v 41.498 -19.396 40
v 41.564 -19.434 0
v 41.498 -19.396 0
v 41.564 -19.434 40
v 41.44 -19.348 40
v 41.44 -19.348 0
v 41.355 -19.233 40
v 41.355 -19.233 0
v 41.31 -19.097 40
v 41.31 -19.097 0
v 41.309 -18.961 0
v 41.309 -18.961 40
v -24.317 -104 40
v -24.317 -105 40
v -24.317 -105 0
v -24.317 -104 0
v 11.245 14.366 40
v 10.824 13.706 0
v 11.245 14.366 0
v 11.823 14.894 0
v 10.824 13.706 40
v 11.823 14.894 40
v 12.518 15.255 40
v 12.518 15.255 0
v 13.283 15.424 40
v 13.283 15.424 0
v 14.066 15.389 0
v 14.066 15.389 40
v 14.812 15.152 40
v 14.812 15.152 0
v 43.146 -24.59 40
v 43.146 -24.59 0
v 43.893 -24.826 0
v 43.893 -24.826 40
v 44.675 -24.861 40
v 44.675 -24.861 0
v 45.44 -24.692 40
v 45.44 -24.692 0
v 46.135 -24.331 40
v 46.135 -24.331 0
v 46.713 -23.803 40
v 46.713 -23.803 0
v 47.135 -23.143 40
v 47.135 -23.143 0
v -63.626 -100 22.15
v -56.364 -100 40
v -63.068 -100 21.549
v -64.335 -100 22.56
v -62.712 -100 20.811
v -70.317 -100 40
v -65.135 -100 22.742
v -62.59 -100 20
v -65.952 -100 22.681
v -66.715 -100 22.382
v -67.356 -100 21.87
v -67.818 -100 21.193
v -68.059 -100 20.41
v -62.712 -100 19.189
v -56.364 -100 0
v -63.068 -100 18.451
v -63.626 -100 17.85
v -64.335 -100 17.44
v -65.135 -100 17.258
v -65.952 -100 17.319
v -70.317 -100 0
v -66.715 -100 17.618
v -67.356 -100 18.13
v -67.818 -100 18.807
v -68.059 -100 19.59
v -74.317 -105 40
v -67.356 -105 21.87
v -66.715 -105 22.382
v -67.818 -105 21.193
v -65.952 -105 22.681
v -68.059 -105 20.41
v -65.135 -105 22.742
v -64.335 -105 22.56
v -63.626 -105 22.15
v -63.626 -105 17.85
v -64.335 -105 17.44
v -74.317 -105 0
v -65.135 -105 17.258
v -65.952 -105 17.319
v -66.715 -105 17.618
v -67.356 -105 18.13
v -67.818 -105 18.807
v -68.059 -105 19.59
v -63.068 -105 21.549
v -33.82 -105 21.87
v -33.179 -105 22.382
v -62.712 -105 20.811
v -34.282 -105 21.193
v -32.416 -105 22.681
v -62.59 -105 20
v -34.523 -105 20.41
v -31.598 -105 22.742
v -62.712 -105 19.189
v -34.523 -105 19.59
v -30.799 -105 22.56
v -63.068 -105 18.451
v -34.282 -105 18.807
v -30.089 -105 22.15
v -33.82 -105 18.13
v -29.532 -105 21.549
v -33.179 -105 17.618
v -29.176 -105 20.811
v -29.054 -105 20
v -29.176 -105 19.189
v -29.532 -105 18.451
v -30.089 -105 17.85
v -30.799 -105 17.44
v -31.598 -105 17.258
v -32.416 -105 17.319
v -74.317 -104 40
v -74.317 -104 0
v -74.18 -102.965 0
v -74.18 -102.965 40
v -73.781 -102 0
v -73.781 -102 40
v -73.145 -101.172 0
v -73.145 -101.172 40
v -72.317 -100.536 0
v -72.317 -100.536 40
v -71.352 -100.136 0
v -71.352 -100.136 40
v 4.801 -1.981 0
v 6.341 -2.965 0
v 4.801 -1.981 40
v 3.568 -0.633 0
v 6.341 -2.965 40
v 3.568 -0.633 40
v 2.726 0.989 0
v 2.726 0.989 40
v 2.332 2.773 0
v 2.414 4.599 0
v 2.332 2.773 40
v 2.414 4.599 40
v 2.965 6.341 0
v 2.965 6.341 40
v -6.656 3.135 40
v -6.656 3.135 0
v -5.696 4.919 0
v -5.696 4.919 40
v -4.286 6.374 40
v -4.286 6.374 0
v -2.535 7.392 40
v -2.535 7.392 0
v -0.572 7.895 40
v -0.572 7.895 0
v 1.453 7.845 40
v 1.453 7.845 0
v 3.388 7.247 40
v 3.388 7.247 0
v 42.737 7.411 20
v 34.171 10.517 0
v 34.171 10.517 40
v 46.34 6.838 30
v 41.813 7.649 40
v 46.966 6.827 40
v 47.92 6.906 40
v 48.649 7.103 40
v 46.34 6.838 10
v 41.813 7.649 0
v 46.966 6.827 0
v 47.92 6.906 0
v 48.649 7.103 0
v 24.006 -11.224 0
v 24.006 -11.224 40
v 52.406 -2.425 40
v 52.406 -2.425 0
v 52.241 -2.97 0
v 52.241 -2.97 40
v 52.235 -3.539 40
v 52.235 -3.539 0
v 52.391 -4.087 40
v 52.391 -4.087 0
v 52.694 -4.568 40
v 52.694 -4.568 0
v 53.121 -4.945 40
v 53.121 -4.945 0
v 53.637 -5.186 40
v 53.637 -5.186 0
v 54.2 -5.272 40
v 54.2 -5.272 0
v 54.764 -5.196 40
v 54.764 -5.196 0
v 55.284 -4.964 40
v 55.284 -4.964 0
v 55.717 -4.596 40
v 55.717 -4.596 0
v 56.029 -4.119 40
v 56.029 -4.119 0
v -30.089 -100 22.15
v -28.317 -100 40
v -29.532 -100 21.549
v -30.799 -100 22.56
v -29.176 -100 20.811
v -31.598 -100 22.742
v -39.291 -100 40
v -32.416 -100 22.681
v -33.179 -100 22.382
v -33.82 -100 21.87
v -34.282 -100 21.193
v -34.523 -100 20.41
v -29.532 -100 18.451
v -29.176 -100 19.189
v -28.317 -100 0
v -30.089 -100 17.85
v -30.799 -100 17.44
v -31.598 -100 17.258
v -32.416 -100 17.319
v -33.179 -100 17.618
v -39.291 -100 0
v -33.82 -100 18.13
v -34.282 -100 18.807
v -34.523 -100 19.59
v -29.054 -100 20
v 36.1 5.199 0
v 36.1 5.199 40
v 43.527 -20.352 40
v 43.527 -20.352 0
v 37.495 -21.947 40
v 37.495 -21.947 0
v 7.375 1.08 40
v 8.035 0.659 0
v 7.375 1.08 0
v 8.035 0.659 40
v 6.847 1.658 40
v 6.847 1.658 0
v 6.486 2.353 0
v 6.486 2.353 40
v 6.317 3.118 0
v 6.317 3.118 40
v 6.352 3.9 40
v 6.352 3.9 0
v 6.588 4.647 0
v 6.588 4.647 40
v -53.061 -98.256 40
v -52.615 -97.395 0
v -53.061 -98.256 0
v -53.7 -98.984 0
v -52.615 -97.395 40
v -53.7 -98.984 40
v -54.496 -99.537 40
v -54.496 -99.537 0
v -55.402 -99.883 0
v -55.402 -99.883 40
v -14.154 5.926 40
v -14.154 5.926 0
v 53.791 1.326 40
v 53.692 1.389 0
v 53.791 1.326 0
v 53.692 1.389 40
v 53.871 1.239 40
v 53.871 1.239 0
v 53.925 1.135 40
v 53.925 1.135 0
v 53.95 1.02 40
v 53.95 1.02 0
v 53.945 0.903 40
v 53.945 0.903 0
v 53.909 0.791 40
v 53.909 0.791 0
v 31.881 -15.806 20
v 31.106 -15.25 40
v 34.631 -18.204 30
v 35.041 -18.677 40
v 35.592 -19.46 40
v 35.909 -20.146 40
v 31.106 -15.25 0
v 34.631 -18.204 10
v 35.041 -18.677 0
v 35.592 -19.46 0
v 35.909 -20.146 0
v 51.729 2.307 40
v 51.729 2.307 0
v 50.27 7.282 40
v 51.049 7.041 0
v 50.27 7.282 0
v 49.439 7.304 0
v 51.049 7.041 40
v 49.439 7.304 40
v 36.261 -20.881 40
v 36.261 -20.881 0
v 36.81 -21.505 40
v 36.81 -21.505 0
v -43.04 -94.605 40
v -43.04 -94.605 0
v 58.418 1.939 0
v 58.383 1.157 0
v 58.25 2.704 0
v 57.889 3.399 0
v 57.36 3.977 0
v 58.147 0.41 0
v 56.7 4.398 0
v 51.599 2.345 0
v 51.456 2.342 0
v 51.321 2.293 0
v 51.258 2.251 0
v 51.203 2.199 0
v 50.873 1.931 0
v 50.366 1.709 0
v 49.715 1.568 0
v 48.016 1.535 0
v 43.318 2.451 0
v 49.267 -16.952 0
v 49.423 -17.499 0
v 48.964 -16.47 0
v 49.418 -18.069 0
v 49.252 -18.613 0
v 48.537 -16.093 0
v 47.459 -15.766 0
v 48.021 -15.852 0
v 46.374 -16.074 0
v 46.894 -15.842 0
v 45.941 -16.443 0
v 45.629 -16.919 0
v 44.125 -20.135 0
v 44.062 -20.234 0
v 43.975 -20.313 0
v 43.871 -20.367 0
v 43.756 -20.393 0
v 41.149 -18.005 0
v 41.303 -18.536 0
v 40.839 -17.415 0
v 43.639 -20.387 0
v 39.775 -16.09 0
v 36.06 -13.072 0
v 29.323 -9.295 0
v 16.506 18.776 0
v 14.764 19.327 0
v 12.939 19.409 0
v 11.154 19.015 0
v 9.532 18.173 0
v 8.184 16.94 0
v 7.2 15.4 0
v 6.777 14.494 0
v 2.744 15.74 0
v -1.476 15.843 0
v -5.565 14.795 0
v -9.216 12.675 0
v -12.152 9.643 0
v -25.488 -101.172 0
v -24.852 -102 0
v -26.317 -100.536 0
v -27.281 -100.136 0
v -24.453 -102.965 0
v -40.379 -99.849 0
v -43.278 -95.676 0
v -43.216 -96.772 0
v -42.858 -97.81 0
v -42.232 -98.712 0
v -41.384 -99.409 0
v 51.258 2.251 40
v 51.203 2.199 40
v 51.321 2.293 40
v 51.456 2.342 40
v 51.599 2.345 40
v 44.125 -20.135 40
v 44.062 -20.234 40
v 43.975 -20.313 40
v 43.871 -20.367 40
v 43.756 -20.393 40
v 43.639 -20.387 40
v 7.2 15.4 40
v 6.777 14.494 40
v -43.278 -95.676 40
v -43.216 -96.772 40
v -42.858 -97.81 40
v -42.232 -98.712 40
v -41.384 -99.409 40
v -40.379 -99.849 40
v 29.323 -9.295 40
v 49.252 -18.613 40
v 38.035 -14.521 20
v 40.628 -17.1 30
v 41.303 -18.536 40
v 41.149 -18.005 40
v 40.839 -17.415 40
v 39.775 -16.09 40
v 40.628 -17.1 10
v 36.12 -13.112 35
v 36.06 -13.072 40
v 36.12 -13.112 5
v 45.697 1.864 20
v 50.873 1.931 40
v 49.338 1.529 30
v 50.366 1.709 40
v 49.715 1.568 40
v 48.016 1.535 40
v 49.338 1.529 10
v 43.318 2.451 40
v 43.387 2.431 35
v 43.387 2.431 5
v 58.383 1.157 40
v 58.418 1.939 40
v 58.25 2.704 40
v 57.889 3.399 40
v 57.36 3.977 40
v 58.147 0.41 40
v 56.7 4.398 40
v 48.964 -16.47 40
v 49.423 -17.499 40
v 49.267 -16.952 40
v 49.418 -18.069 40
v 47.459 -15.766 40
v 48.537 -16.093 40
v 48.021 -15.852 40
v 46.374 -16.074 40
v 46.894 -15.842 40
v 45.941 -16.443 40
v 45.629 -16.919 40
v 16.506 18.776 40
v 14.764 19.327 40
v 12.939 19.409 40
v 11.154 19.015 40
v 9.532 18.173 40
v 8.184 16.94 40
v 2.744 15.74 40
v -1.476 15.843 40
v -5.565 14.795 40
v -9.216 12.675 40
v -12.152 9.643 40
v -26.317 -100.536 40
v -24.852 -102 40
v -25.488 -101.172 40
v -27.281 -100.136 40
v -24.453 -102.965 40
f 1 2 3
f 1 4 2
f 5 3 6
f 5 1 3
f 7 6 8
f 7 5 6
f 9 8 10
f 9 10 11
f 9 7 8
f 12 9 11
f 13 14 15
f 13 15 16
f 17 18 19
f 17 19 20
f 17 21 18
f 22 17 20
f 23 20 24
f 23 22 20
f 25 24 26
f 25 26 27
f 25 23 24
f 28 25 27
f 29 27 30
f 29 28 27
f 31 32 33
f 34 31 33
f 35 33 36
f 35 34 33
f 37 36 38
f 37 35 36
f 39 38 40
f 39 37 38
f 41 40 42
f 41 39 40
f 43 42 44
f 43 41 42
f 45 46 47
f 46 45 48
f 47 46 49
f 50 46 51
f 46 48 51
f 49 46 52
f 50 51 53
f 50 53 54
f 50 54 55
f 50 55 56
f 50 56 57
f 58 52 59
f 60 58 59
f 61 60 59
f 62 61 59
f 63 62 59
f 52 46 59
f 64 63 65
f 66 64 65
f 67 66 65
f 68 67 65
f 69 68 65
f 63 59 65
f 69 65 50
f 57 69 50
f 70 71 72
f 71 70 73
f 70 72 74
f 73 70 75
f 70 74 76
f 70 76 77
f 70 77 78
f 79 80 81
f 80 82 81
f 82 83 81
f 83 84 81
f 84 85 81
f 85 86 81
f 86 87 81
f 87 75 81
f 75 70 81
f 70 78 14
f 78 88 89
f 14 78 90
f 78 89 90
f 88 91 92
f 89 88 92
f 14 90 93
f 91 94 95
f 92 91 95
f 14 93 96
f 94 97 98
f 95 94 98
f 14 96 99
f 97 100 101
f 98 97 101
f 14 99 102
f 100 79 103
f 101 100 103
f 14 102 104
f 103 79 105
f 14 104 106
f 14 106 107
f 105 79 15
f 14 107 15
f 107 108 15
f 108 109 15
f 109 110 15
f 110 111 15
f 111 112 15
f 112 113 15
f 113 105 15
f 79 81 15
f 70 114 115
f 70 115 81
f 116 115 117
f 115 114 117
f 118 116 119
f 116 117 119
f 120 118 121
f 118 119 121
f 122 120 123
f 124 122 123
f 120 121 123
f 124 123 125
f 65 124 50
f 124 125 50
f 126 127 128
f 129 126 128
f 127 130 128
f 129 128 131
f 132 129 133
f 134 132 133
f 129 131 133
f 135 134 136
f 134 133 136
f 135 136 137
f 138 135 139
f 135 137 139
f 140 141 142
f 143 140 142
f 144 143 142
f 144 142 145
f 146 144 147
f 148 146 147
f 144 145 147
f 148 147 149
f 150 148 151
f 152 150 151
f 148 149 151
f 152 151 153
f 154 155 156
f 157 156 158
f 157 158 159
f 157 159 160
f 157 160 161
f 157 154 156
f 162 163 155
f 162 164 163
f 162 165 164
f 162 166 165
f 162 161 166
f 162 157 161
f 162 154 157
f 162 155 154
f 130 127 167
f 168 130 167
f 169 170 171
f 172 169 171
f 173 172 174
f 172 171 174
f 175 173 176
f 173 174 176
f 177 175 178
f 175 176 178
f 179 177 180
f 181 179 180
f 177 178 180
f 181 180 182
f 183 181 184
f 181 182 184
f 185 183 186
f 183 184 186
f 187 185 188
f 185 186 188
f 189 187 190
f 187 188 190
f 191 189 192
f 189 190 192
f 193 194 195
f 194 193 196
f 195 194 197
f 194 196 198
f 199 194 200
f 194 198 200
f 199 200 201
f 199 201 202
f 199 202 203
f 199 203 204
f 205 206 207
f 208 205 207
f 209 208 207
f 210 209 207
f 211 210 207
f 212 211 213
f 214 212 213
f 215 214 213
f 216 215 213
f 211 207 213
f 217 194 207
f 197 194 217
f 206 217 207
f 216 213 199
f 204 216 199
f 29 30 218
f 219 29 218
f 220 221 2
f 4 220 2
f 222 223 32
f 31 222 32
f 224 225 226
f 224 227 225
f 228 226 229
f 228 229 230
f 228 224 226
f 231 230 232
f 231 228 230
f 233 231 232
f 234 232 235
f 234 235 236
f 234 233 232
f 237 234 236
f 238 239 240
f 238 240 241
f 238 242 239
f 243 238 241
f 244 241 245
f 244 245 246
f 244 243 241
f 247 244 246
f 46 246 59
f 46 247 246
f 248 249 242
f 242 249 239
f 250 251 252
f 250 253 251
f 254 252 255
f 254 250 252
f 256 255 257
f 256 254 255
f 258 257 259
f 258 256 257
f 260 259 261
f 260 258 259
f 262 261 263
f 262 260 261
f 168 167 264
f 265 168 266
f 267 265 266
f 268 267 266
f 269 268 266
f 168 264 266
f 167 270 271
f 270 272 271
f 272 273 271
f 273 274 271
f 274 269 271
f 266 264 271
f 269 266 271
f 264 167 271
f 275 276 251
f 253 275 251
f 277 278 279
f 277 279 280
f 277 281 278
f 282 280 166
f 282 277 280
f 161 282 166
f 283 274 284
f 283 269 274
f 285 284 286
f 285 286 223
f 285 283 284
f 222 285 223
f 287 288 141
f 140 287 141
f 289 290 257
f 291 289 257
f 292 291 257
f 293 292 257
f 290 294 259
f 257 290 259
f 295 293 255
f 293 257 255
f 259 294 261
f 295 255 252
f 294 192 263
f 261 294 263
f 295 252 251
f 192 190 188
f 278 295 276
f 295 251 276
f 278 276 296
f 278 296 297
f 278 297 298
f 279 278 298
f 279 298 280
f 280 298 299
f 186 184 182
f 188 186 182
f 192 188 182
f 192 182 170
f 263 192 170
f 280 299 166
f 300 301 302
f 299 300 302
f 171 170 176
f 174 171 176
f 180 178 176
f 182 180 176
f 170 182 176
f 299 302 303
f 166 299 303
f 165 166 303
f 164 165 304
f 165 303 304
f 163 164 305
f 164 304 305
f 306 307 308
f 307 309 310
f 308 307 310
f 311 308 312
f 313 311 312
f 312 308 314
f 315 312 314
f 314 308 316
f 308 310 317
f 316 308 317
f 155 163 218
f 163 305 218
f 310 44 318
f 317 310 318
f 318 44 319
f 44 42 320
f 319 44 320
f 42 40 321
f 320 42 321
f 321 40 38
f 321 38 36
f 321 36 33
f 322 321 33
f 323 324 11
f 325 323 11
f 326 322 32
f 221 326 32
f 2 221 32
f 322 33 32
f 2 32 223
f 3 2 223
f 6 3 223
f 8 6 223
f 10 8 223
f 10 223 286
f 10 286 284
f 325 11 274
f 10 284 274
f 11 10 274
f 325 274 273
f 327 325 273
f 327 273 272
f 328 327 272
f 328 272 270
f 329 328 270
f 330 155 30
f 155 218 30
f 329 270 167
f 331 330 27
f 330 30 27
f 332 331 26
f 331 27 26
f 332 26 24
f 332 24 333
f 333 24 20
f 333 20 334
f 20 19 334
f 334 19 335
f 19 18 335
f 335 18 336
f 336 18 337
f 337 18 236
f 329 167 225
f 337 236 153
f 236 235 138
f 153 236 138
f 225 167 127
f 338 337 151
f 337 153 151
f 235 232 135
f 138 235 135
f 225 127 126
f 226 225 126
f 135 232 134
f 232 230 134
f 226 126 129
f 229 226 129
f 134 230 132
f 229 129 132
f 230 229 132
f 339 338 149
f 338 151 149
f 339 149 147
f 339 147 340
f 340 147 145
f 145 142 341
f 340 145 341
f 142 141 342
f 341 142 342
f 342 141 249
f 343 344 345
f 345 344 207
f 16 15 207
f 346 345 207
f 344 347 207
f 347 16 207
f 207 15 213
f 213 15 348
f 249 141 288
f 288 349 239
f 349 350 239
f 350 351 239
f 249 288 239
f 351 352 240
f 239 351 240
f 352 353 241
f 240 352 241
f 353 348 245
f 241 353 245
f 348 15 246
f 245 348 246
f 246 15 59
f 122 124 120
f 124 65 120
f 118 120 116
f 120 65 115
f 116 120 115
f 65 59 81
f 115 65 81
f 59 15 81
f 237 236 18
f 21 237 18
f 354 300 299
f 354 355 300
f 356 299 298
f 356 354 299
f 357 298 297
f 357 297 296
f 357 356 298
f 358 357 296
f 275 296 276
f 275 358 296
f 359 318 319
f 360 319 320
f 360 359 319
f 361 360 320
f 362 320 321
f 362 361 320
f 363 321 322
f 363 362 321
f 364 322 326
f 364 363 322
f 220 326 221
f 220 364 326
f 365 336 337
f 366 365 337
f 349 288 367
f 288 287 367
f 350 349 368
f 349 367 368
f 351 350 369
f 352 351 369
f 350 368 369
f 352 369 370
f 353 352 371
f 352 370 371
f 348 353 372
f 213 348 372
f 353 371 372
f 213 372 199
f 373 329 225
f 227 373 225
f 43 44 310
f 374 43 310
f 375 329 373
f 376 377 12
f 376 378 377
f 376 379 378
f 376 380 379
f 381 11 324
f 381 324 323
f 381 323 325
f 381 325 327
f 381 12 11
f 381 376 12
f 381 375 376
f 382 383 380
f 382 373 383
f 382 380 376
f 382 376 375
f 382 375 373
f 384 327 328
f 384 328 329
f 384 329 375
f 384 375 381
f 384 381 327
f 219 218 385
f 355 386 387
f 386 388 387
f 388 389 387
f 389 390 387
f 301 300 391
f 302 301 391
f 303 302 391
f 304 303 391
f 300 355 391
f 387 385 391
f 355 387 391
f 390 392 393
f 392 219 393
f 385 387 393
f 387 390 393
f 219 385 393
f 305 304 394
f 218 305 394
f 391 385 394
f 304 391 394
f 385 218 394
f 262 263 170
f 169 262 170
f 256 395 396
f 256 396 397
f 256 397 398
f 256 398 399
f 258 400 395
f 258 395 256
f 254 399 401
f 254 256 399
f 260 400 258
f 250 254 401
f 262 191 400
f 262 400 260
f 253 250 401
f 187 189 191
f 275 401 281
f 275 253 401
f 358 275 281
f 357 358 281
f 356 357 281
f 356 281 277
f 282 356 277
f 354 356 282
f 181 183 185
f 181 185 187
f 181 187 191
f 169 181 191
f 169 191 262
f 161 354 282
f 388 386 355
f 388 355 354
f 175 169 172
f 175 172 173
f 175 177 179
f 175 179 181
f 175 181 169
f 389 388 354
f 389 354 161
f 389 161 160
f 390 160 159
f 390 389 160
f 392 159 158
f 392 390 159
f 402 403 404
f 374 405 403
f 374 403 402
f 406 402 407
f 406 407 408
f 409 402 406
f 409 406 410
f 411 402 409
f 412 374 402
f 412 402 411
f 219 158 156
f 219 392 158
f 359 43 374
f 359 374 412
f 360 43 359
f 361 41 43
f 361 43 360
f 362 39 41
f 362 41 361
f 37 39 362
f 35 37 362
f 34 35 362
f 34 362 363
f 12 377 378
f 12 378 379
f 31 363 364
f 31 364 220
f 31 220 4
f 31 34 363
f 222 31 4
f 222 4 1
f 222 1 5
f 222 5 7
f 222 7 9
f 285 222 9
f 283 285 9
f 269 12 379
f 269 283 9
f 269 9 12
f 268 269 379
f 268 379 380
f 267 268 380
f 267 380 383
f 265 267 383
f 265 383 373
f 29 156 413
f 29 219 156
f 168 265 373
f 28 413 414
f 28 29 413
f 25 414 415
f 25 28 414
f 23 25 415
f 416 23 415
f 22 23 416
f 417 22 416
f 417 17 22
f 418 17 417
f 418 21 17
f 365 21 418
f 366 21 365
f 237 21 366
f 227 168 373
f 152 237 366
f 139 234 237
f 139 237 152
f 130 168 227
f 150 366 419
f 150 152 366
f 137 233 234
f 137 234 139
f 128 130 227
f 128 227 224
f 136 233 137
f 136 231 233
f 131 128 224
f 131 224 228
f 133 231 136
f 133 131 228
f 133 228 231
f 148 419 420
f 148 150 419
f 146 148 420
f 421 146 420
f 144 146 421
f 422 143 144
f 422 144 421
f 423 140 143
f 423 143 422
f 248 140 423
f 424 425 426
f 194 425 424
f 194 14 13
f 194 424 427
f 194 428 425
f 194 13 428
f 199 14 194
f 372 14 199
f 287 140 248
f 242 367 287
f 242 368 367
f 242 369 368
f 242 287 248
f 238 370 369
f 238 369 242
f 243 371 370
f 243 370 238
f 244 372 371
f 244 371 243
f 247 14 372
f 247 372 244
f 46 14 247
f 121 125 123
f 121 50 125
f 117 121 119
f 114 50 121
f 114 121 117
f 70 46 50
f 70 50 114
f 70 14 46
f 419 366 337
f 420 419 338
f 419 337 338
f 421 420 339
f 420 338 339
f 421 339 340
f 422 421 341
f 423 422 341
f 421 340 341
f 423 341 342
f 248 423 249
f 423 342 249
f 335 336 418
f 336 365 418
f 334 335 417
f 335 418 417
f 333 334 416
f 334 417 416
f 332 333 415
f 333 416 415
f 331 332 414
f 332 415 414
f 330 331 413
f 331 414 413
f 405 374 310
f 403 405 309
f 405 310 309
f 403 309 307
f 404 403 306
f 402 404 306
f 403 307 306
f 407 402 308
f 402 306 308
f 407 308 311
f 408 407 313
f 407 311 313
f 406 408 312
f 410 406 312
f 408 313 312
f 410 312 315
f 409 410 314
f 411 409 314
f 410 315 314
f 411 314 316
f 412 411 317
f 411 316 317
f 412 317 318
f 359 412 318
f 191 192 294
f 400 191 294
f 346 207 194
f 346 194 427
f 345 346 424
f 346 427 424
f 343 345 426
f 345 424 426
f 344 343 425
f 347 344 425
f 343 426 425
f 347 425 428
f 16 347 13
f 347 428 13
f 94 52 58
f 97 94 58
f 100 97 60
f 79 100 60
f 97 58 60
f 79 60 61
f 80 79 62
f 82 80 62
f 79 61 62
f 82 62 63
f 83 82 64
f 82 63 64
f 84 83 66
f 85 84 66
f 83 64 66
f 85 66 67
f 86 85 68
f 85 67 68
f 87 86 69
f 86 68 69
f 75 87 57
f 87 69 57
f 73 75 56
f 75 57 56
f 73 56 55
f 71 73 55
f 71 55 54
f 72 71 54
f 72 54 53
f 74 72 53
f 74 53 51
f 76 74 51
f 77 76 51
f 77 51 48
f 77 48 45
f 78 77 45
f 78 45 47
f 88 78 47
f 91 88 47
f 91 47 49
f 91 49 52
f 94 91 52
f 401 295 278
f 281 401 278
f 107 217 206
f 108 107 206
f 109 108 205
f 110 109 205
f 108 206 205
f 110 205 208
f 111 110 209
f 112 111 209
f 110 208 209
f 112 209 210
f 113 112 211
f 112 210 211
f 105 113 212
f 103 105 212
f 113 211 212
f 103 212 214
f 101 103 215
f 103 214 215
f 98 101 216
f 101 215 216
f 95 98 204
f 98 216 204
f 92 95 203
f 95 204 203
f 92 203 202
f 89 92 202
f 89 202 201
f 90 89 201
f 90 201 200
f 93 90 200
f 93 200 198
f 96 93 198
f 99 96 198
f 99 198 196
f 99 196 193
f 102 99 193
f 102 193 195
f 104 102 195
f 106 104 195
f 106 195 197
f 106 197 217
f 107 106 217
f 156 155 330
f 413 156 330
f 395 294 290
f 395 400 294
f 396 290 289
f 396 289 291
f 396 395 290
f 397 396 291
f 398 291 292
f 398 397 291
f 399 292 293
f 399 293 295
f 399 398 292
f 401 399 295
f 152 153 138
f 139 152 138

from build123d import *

# Parameters (mm, degrees)
BOSS_EXTRUDE1_DEPTH = 40
FILLET1_SIZE        = 15
FILLET1_SIZE_2      = 4
FILLET2_SIZE        = 15
FILLET2_SIZE_2      = 4
FILLET3_SIZE        = 15
FILLET3_SIZE_2      = 4
FILLET4_SIZE        = 15
FILLET4_SIZE_2      = 4
FILLET5_R           = 3
FILLET6_R           = 0.45
FILLET8_R           = 7
FILLET9_R           = 3
FILLET10_R          = 4
CUT_EXTRUDE1_DEPTH  = 147.245106811
FILLET11_R          = 4


with BuildPart() as part:
    # Sketch1 → Boss-Extrude1 (new body)
    with BuildSketch(Plane.XY):
        with BuildLine():
            ThreePointArc((6.77692336, 14.493905953), (-5.565334282, 14.795328723), (-14.153654854, 5.926116291))
            Line((-14.153654854, 5.926116291), (-53.584656115, -100))
            Line((-53.584656115, -100), (-74.316504114, -100))
            Line((-74.316504114, -100), (-74.316504114, -105))
            Line((-74.316504114, -105), (-24.316504114, -105))
            Line((-24.316504114, -105), (-24.316504114, -100))
            Line((-24.316504114, -100), (-45.048352113, -100))
            Line((-45.048352113, -100), (-6.656264884, 3.135212559))
            ThreePointArc((-6.656264884, 3.135212559), (-2.534671543, 7.39160781), (3.38846168, 7.246952976))
            Line((3.38846168, 7.246952976), (0, 0))
            Line((0, 0), (37.593568565, -17.577644966))
            Line((37.593568565, -17.577644966), (35.899337725, -21.201121454))
            Line((35.899337725, -21.201121454), (45.863898068, -25.860256264))
            Line((45.863898068, -25.860256264), (49.252359748, -18.613303288))
            ThreePointArc((49.252359748, -18.613303288), (48.287736924, -15.954449623), (45.62888326, -16.919072448))
            Line((45.62888326, -16.919072448), (43.93465242, -20.542548936))
            Line((43.93465242, -20.542548936), (41.217045053, -19.271875806))
            Line((41.217045053, -19.271875806), (42.911275893, -15.648399317))
            Line((42.911275893, -15.648399317), (5.317707328, 1.929245648))
            Line((5.317707328, 1.929245648), (12.094630689, 16.423151601))
            Line((12.094630689, 16.423151601), (49.688199254, -1.154493365))
            Line((49.688199254, -1.154493365), (51.382430094, 2.468983124))
            Line((51.382430094, 2.468983124), (54.10003746, 1.198309994))
            Line((54.10003746, 1.198309994), (52.40580662, -2.425166495))
            ThreePointArc((52.40580662, -2.425166495), (53.370429444, -5.084020159), (56.029283108, -4.119397335))
            Line((56.029283108, -4.119397335), (59.417744788, 3.127555642))
            Line((59.417744788, 3.127555642), (49.453184446, 7.786690452))
            Line((49.453184446, 7.786690452), (47.758953606, 4.163213964))
            Line((47.758953606, 4.163213964), (10.16538504, 21.740858929))
            Line((10.16538504, 21.740858929), (6.77692336, 14.493905953))
        make_face()
    extrude(amount=BOSS_EXTRUDE1_DEPTH)

    # Fillet1
    # an asymmetric fillet: 15, 4 mm, written as the material it takes off along each edge
    with BuildSketch(Plane(origin=(49.688199254, -1.154493365, -37.5), x_dir=(-0.9058691220518403, 0.42355771001485515, 0), z_dir=(0, 0, 1))) as fillet1_piece_1:
        with BuildLine():
            Bezier((FILLET1_SIZE, 0), (0, 0), (0, -FILLET1_SIZE_2), weights=[1, 0.707106781, 1])
            Line((0, -FILLET1_SIZE_2), (0, 0))
            Line((0, 0), (FILLET1_SIZE, 0))
        make_face()
    extrude(amount=115, mode=Mode.SUBTRACT)

    # Fillet2
    # an asymmetric fillet: 15, 4 mm, written as the material it adds along each edge
    with BuildSketch(Plane(origin=(47.758953606, 4.163213964, 0), x_dir=(-0.9058691220518406, 0.42355771001485454, 0), z_dir=(0, 0, 1))) as fillet2_piece_1:
        with BuildLine():
            Bezier((FILLET2_SIZE, 0), (0, 0), (0, -FILLET2_SIZE_2), weights=[1, 0.707106781, 1])
            Line((0, -FILLET2_SIZE_2), (0, 0))
            Line((0, 0), (FILLET2_SIZE, 0))
        make_face()
    extrude(amount=40)

    # Fillet3
    # an asymmetric fillet: 15, 4 mm, written as the material it takes off along each edge
    with BuildSketch(Plane(origin=(42.911275893, -15.648399317, -37.5), x_dir=(-0.9058691220518403, 0.4235577100148549, 0), z_dir=(0, 0, 1))) as fillet3_piece_1:
        with BuildLine():
            Bezier((FILLET3_SIZE, 0), (0, 0), (0, FILLET3_SIZE_2), weights=[1, 0.707106781, 1])
            Line((0, FILLET3_SIZE_2), (0, 0))
            Line((0, 0), (FILLET3_SIZE, 0))
        make_face()
    extrude(amount=115, mode=Mode.SUBTRACT)

    # Fillet4
    # an asymmetric fillet: 15, 4 mm, written as the material it adds along each edge
    with BuildSketch(Plane(origin=(37.593568565, -17.577644966, 0), x_dir=(-0.9058691220518404, 0.42355771001485476, 0), z_dir=(0, 0, 1))) as fillet4_piece_1:
        with BuildLine():
            Bezier((FILLET4_SIZE, 0), (0, 0), (0, FILLET4_SIZE_2), weights=[1, 0.707106781, 1])
            Line((0, FILLET4_SIZE_2), (0, 0))
            Line((0, 0), (FILLET4_SIZE, 0))
        make_face()
    extrude(amount=40)

    # Fillet5
    fillet5_edges = [part.edges().sort_by_distance(p)[0] for p in [
        (45.863898068, -25.860256264, 20),
        (59.417744788, 3.127555642, 20),
        (35.899337725, -21.201121454, 20),
        (49.453184446, 7.786690452, 20),
    ]]
    fillet(fillet5_edges, radius=FILLET5_R)

    # Fillet6
    fillet6_edges = [part.edges().sort_by_distance(p)[0] for p in [
        (41.217045053, -19.271875806, 20),
        (43.93465242, -20.542548936, 20),
        (51.382430094, 2.468983124, 20),
        (54.10003746, 1.198309994, 20),
    ]]
    fillet(fillet6_edges, radius=FILLET6_R)

    # Fillet8
    fillet8_edges = [part.edges().sort_by_distance(p)[0] for p in [
        (0, 0, 20),
        (10.16538504, 21.740858929, 20),
    ]]
    fillet(fillet8_edges, radius=FILLET8_R)

    # Fillet9
    fillet9_edges = [part.edges().sort_by_distance(p)[0] for p in [
        (5.317707328, 1.929245648, 20),
        (12.094630689, 16.423151601, 20),
    ]]
    fillet(fillet9_edges, radius=FILLET9_R)

    # Fillet10
    fillet10_edges = [part.edges().sort_by_distance(p)[0] for p in [
        (-45.048352113, -100, 20),
        (-53.584656115, -100, 20),
    ]]
    fillet(fillet10_edges, radius=FILLET10_R)

    # Sketch2 → Cut-Extrude1 (cut, through all)
    with BuildSketch(Plane(origin=(0, -100, 0), x_dir=(1, 0, 0), z_dir=(0, 1, 0))):
        with BuildLine():
            ThreePointArc((-68.09015603, -20), (-65.34015603, -22.75), (-62.59015603, -20))
            Line((-62.59015603, -20), (-68.09015603, -20))
        make_face()
        with BuildLine():
            Line((-68.09015603, -20), (-62.59015603, -20))
            ThreePointArc((-62.59015603, -20), (-65.34015603, -17.25), (-68.09015603, -20))
        make_face()
        with BuildLine():
            ThreePointArc((-34.553852028, -20), (-31.803852028, -22.75), (-29.053852028, -20))
            Line((-29.053852028, -20), (-34.553852028, -20))
        make_face()
        with BuildLine():
            Line((-34.553852028, -20), (-29.053852028, -20))
            ThreePointArc((-29.053852028, -20), (-31.803852028, -17.25), (-34.553852028, -20))
        make_face()
    extrude(amount=-CUT_EXTRUDE1_DEPTH, mode=Mode.SUBTRACT)

    # Fillet11
    fillet11_edges = [part.edges().sort_by_distance(p)[0] for p in [
        (-24.316504114, -100, 20),
        (-74.316504114, -100, 20),
    ]]
    fillet(fillet11_edges, radius=FILLET11_R)


solid = part.part
